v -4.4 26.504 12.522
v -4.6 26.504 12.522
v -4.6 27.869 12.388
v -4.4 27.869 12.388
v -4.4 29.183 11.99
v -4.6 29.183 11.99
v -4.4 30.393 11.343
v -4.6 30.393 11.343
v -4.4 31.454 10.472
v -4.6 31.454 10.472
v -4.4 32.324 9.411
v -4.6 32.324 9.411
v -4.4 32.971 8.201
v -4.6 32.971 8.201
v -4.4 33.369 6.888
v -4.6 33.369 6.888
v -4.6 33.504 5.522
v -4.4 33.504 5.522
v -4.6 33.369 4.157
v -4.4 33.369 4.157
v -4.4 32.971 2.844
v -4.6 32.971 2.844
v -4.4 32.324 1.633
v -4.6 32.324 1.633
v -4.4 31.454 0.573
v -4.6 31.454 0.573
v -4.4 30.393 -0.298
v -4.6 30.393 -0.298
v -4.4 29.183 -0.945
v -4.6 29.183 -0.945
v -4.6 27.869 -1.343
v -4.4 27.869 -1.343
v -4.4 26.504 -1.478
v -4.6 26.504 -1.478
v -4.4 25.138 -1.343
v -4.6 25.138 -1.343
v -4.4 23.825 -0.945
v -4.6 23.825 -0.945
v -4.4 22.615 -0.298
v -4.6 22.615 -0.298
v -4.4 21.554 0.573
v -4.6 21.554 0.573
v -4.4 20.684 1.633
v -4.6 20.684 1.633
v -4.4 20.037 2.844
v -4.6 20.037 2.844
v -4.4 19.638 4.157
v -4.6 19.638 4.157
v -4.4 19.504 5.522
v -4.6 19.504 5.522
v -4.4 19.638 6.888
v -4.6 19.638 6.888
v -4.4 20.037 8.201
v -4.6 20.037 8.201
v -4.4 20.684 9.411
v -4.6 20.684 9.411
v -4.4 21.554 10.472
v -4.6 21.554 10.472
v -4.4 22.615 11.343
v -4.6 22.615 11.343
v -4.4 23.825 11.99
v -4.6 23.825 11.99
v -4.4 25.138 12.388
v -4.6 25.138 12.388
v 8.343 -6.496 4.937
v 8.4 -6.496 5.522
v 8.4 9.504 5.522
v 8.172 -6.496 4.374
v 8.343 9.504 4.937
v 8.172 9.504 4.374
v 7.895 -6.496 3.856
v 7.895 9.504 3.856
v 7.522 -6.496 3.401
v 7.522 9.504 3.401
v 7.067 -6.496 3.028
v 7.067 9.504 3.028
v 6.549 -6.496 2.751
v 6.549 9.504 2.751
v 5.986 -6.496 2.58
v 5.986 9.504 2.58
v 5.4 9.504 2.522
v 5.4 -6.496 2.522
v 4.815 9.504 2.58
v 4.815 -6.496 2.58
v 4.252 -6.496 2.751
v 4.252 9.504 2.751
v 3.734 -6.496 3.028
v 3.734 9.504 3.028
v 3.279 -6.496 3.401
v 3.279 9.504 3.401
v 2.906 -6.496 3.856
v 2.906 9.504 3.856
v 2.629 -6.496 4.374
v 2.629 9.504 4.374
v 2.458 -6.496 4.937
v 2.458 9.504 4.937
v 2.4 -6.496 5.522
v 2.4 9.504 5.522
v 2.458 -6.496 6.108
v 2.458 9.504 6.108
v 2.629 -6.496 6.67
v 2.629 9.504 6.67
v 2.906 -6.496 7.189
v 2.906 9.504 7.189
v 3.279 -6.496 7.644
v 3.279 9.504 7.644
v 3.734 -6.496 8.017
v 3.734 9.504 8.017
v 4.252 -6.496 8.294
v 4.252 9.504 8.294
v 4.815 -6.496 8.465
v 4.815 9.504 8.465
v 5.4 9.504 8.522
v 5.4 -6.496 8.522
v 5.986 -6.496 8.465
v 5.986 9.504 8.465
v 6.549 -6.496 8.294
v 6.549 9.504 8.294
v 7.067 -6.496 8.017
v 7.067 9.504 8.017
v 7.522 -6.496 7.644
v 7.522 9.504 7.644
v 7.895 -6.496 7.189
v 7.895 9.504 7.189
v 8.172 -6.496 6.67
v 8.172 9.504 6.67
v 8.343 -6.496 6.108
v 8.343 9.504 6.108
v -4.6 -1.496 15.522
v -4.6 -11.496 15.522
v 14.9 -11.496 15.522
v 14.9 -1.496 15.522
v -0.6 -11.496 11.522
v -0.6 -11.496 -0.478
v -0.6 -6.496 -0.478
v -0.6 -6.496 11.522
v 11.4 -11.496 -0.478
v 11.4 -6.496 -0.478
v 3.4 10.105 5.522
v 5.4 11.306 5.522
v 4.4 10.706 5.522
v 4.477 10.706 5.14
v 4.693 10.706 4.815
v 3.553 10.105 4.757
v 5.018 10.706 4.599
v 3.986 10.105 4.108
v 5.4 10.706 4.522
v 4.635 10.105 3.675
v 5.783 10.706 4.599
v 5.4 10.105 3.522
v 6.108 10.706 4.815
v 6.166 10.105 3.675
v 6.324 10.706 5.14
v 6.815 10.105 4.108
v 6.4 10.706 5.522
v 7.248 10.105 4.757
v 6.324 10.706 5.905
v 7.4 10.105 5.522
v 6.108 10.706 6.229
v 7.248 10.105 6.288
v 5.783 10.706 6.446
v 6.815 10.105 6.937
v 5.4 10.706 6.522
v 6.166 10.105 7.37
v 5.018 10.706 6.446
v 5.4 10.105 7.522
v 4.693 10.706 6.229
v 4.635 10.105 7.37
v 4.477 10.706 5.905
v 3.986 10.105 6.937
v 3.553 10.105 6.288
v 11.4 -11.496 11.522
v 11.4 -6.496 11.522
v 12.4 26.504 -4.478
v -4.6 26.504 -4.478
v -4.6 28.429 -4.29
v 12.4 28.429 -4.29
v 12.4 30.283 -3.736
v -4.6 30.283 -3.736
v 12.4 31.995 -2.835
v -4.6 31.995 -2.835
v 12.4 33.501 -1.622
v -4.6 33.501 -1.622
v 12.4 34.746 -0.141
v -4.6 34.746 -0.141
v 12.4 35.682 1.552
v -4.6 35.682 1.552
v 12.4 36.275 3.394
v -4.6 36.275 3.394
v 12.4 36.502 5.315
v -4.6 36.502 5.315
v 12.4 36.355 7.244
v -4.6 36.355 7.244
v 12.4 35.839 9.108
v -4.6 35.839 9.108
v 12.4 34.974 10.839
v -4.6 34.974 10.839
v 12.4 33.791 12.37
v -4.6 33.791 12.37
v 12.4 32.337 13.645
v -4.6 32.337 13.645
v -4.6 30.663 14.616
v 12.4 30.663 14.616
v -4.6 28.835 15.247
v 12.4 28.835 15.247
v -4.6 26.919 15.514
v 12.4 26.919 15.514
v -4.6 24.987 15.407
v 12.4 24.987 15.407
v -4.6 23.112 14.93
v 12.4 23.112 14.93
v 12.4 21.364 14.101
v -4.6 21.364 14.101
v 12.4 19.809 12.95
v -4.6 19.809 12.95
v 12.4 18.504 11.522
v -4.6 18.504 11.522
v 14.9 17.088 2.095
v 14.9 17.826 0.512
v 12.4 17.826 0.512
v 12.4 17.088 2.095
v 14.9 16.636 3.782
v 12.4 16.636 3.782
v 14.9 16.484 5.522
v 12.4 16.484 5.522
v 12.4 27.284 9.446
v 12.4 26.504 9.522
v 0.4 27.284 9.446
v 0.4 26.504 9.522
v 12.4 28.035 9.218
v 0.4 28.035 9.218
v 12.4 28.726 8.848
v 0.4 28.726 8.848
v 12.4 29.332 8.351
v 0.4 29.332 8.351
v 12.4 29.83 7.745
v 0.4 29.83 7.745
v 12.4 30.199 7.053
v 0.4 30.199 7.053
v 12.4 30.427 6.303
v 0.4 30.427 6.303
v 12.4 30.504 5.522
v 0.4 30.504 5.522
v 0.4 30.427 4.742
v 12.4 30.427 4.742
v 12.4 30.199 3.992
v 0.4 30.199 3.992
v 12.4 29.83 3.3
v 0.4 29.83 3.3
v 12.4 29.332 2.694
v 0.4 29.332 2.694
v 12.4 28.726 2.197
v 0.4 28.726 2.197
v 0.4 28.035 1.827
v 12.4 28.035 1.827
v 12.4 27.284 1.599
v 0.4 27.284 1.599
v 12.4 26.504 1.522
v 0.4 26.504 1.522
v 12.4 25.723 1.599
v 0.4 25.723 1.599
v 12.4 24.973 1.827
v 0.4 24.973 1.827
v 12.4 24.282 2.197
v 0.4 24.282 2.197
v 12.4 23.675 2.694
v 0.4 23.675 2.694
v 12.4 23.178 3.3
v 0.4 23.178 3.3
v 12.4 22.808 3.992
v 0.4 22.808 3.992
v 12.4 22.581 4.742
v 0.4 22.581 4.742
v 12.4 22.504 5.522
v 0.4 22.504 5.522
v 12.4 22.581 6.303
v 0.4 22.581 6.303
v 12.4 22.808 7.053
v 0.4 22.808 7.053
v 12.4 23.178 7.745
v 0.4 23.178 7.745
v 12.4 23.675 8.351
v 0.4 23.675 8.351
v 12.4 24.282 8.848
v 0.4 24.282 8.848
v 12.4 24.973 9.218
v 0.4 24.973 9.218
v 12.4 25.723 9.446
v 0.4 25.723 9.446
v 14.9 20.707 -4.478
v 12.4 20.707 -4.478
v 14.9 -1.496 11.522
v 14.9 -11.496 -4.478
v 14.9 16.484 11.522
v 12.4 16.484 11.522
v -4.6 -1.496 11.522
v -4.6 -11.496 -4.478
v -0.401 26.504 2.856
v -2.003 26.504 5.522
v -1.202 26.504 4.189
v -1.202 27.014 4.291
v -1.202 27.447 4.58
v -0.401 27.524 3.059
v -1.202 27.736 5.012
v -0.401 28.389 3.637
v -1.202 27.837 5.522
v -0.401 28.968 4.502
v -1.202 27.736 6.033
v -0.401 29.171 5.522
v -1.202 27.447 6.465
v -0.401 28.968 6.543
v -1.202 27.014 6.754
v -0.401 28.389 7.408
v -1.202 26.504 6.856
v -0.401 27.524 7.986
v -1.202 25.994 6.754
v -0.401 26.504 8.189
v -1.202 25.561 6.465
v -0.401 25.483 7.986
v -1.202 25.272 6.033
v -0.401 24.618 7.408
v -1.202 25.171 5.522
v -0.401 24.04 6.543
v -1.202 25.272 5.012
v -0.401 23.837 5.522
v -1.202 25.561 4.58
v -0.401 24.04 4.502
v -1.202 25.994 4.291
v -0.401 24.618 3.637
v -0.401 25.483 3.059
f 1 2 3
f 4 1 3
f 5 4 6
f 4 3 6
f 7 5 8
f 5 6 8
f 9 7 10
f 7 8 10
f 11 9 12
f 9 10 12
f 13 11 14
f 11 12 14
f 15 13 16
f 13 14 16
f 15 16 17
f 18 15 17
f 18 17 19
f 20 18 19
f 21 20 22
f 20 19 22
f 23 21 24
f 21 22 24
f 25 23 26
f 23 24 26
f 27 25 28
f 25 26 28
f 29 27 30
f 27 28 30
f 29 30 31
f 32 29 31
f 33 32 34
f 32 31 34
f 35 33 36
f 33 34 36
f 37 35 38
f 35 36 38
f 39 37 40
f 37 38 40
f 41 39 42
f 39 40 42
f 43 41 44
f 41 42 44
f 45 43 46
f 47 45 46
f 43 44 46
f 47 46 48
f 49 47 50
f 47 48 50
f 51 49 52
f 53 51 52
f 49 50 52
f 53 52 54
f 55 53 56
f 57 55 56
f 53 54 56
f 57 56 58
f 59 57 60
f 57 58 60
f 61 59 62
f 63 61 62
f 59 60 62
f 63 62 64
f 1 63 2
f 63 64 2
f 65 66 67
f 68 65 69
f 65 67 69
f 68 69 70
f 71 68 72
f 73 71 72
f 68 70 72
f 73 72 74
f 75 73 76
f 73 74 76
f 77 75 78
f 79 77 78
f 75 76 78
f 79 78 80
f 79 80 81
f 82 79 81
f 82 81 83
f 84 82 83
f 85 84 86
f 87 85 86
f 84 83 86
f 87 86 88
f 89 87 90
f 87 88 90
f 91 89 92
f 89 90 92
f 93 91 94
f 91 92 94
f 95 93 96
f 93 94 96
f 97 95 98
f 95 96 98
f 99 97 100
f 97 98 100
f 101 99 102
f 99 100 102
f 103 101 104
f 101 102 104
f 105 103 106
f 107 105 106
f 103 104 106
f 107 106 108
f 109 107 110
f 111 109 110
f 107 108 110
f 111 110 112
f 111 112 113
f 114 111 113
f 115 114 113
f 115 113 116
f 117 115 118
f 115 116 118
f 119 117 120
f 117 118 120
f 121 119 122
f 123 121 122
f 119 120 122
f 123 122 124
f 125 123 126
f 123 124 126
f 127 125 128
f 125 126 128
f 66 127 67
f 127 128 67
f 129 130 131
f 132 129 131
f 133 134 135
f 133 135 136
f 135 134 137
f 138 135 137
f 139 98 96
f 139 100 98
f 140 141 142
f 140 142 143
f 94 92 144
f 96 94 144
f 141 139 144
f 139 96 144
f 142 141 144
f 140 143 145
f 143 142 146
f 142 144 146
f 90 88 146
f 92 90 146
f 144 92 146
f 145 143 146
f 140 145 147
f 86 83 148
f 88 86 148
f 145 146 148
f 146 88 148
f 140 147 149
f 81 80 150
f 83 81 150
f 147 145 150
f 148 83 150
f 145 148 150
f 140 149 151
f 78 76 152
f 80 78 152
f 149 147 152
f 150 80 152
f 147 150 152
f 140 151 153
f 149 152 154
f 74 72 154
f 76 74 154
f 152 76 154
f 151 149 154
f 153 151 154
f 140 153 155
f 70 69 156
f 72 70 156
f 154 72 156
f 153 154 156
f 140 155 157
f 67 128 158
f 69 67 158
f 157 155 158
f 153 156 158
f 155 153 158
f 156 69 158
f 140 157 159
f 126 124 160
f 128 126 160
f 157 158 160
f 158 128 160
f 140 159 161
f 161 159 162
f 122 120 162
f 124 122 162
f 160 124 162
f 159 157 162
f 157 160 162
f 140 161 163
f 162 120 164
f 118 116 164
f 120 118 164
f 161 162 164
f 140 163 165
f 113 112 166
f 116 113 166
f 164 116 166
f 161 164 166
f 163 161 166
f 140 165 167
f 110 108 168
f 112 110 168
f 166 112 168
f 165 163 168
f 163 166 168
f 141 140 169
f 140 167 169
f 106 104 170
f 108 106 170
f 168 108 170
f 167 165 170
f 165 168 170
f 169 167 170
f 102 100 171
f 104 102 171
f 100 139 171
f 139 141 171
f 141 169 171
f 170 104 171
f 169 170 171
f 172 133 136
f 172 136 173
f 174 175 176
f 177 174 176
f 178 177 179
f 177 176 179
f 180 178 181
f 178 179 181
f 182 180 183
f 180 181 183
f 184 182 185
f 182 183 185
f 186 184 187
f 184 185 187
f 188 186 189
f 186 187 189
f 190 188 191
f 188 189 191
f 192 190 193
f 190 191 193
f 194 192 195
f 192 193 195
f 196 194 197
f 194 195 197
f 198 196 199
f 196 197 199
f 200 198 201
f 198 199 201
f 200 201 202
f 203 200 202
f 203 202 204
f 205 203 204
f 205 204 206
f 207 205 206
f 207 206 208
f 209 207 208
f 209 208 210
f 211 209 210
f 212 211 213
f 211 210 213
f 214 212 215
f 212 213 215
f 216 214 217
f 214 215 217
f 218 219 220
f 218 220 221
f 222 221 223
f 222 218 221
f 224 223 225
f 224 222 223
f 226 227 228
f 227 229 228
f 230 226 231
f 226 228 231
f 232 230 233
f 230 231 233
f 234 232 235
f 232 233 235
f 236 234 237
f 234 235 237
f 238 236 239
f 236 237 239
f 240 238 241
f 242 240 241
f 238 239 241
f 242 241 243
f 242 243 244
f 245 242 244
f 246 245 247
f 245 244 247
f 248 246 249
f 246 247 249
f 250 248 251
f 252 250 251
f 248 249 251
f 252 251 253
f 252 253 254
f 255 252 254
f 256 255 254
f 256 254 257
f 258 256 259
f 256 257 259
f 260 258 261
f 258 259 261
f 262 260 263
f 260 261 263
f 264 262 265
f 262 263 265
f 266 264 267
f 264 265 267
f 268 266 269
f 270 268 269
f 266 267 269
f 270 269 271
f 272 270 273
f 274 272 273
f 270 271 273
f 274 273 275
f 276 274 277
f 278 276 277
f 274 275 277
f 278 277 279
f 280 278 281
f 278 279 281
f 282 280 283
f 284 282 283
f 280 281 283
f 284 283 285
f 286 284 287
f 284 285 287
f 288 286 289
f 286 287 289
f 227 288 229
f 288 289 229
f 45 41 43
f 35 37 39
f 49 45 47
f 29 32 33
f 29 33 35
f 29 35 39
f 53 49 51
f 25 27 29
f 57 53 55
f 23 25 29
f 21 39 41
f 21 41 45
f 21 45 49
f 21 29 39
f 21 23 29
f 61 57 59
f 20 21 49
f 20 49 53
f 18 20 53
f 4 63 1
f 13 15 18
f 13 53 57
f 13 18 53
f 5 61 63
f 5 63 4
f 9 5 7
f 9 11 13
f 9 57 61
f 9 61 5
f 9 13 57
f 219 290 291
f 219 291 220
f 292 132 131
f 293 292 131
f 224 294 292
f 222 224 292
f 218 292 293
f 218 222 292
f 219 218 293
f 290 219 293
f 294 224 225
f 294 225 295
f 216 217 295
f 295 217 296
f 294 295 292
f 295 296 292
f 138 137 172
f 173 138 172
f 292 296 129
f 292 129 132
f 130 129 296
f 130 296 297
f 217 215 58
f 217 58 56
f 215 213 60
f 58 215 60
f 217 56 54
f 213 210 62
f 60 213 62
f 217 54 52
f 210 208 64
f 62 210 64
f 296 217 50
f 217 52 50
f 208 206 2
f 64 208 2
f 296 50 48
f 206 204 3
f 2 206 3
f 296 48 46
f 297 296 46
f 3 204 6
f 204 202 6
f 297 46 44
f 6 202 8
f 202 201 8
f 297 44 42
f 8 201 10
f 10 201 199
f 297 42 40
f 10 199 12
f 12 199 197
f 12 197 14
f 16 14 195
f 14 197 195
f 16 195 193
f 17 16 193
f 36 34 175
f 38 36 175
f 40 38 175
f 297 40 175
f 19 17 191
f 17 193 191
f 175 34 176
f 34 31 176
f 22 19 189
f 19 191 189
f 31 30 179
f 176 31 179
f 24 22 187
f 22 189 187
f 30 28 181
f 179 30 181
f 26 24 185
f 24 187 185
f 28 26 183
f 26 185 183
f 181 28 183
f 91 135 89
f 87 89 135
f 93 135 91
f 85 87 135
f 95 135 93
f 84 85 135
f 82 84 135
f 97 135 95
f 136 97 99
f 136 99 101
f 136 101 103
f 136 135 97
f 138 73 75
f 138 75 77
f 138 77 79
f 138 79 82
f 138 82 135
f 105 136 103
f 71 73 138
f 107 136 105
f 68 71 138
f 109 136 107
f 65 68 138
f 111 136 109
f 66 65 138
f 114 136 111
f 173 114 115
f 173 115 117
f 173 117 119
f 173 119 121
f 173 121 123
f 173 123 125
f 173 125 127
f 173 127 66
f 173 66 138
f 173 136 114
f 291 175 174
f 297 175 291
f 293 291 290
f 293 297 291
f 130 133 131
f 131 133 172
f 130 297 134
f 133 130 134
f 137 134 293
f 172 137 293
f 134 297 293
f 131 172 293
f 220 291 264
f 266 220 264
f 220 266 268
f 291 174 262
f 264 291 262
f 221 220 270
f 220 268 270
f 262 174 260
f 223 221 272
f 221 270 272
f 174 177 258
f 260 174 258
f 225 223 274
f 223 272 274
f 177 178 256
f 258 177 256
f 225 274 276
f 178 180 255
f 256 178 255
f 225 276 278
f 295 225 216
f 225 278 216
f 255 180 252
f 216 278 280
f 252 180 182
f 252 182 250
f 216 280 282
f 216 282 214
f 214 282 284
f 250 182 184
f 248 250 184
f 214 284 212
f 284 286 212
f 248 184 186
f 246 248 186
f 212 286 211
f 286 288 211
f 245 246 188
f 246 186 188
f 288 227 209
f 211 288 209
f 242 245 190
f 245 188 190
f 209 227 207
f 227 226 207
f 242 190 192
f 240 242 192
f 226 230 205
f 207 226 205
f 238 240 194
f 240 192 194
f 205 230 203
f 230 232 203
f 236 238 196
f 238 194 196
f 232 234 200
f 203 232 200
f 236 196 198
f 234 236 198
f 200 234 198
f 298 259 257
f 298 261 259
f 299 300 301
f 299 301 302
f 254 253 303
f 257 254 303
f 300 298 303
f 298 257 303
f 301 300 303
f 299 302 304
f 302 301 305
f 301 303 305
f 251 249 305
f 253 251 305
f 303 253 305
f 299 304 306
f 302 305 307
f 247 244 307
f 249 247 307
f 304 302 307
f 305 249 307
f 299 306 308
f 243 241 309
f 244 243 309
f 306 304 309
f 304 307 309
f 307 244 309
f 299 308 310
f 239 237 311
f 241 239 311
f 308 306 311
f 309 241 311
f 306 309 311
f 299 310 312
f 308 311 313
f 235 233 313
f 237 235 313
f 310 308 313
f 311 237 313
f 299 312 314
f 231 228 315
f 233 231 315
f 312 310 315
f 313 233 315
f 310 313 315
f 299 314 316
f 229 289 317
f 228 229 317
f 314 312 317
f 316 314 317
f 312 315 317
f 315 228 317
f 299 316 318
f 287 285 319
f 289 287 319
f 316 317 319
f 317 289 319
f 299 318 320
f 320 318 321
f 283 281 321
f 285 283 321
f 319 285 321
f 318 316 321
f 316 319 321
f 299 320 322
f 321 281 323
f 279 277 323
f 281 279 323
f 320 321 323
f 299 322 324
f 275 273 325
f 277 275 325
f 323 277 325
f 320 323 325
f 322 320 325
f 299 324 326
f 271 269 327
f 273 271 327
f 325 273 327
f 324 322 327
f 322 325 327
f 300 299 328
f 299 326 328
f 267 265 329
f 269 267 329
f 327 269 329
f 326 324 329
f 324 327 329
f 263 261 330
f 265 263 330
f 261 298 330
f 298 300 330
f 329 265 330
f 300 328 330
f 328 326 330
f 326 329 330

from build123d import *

# Parameters (mm, degrees)
SKETCH1_W                                      = 10
SKETCH1_H                                      = 10
FOOT_DEPTH                                     = 5
SKETCH2_W                                      = 10
SKETCH2_H                                      = 8
LEG_DEPTH                                      = 14
SKETCH3_R                                      = 5
HIP_CONNECTOR_DEPTH                            = 10
SKETCH20_R                                     = 3.5
DECORATIVE_CIRCLE_THAT_MAKES_THIS_EASY_T_DEPTH = 0.1
HIP_ROOM_DEPTH                                 = 1.5
HIP_HOLE_D                                     = 4
HIP_HOLE_DEPTH                                 = 6
HIP_HOLE_TIP                                   = 1.201721238
SKETCH18_W                                     = 6
SKETCH18_H                                     = 6
FOOT_HOLE_DEPTH                                = 2.5
WEIGHT_REDUCTION_MAKE_IT_EASY_TO_ADD_CEN_D     = 3
WEIGHT_REDUCTION_MAKE_IT_EASY_TO_ADD_CEN_DEPTH = 8
WEIGHT_REDUCTION_MAKE_IT_EASY_TO_ADD_CEN_TIP   = 0.901290929
SKETCH19_W                                     = 10
SKETCH19_H                                     = 20
THIGH_GAP_DEPTH                                = 0.25
SCALE1_SCALE                                   = 2


with BuildPart() as part:
    # Sketch1 → Foot (new body)
    with BuildSketch(Plane(origin=(0, 0, 0), x_dir=(1, 0, 0), z_dir=(0, 1, 0))):
        with Locations((5, -5)):
            Rectangle(SKETCH1_W, SKETCH1_H)
    extrude(amount=FOOT_DEPTH)

    # Sketch2 → Leg (add)
    with BuildSketch(Plane(origin=(0, 5, 0), x_dir=(1, 0, 0), z_dir=(0, 1, 0))):
        with Locations((5, -4)):
            Rectangle(SKETCH2_W, SKETCH2_H)
    extrude(amount=LEG_DEPTH)

    # Sketch3 → Hip Connector (add)
    with BuildSketch(Plane(origin=(0, 0, 0), x_dir=(0, 0, -1), z_dir=(1, 0, 0))):
        with Locations((-5, 19)):
            Circle(SKETCH3_R)
    extrude(amount=HIP_CONNECTOR_DEPTH)

    # Sketch20 → Decorative circle that makes this easy to dimension (cut)
    with BuildSketch(Plane.ZY):
        with Locations((5, 19)):
            Circle(SKETCH20_R)
    extrude(amount=-DECORATIVE_CIRCLE_THAT_MAKES_THIS_EASY_T_DEPTH, mode=Mode.SUBTRACT)

    # Sketch4 → Hip room (cut)
    with BuildSketch(Plane(origin=(10, 0, 0), x_dir=(0, 0, -1), z_dir=(1, 0, 0))):
        with BuildLine():
            Line((-5, 13.99), (-10, 13.99))
            Line((-10, 13.99), (-10, 24))
            Line((-10, 24), (0, 24))
            Line((0, 24), (0, 16.101701649))
            Line((0, 16.101701649), (-2.495, 14.661212727))
            ThreePointArc((-2.495, 14.661212727), (-3.703316584, 14.16071161), (-5, 13.99))
        make_face()
    extrude(amount=-HIP_ROOM_DEPTH, mode=Mode.SUBTRACT)

    # Hip hole
    with Locations(Plane(origin=(8.5, 0, 0), x_dir=(0, 0, -1), z_dir=(1, 0, 0))):
        with Locations((-5, 19)):
            Hole(HIP_HOLE_D / 2, depth=HIP_HOLE_DEPTH)
            with Locations((0, 0, -(HIP_HOLE_DEPTH + HIP_HOLE_TIP / 2))):  # 118° drill point
                Cone(0, HIP_HOLE_D / 2, HIP_HOLE_TIP, mode=Mode.SUBTRACT)

    # Sketch18 → Foot hole (cut)
    with BuildSketch(Plane.XZ):
        with Locations((5, 5)):
            Rectangle(SKETCH18_W, SKETCH18_H)
    extrude(amount=-FOOT_HOLE_DEPTH, mode=Mode.SUBTRACT)

    # Weight reduction/make it easy to add centerline hole
    with Locations(Plane(origin=(0, 2.5, 0), x_dir=(-1, 0, 0), z_dir=(0, -1, 0))):
        with Locations((-5, -5)):
            Hole(WEIGHT_REDUCTION_MAKE_IT_EASY_TO_ADD_CEN_D / 2, depth=WEIGHT_REDUCTION_MAKE_IT_EASY_TO_ADD_CEN_DEPTH)
            with Locations((0, 0, -(WEIGHT_REDUCTION_MAKE_IT_EASY_TO_ADD_CEN_DEPTH + WEIGHT_REDUCTION_MAKE_IT_EASY_TO_ADD_CEN_TIP / 2))):  # 118° drill point
                Cone(0, WEIGHT_REDUCTION_MAKE_IT_EASY_TO_ADD_CEN_D / 2, WEIGHT_REDUCTION_MAKE_IT_EASY_TO_ADD_CEN_TIP, mode=Mode.SUBTRACT)

    # Sketch19 → Thigh gap (cut)
    with BuildSketch(Plane(origin=(10, 0, 0), x_dir=(0, 0, -1), z_dir=(1, 0, 0))):
        with Locations((-5, 10)):
            Rectangle(SKETCH19_W, SKETCH19_H)
    extrude(amount=-THIGH_GAP_DEPTH, mode=Mode.SUBTRACT)


with BuildPart() as part_1:
    # Scale1: scaled about (4.599513464, 11.496150449, 4.477610723)
    add(part.part.scale(SCALE1_SCALE).moved(Location((-4.599513464, -11.496150449, -4.477610723))))


solid = part_1.part
